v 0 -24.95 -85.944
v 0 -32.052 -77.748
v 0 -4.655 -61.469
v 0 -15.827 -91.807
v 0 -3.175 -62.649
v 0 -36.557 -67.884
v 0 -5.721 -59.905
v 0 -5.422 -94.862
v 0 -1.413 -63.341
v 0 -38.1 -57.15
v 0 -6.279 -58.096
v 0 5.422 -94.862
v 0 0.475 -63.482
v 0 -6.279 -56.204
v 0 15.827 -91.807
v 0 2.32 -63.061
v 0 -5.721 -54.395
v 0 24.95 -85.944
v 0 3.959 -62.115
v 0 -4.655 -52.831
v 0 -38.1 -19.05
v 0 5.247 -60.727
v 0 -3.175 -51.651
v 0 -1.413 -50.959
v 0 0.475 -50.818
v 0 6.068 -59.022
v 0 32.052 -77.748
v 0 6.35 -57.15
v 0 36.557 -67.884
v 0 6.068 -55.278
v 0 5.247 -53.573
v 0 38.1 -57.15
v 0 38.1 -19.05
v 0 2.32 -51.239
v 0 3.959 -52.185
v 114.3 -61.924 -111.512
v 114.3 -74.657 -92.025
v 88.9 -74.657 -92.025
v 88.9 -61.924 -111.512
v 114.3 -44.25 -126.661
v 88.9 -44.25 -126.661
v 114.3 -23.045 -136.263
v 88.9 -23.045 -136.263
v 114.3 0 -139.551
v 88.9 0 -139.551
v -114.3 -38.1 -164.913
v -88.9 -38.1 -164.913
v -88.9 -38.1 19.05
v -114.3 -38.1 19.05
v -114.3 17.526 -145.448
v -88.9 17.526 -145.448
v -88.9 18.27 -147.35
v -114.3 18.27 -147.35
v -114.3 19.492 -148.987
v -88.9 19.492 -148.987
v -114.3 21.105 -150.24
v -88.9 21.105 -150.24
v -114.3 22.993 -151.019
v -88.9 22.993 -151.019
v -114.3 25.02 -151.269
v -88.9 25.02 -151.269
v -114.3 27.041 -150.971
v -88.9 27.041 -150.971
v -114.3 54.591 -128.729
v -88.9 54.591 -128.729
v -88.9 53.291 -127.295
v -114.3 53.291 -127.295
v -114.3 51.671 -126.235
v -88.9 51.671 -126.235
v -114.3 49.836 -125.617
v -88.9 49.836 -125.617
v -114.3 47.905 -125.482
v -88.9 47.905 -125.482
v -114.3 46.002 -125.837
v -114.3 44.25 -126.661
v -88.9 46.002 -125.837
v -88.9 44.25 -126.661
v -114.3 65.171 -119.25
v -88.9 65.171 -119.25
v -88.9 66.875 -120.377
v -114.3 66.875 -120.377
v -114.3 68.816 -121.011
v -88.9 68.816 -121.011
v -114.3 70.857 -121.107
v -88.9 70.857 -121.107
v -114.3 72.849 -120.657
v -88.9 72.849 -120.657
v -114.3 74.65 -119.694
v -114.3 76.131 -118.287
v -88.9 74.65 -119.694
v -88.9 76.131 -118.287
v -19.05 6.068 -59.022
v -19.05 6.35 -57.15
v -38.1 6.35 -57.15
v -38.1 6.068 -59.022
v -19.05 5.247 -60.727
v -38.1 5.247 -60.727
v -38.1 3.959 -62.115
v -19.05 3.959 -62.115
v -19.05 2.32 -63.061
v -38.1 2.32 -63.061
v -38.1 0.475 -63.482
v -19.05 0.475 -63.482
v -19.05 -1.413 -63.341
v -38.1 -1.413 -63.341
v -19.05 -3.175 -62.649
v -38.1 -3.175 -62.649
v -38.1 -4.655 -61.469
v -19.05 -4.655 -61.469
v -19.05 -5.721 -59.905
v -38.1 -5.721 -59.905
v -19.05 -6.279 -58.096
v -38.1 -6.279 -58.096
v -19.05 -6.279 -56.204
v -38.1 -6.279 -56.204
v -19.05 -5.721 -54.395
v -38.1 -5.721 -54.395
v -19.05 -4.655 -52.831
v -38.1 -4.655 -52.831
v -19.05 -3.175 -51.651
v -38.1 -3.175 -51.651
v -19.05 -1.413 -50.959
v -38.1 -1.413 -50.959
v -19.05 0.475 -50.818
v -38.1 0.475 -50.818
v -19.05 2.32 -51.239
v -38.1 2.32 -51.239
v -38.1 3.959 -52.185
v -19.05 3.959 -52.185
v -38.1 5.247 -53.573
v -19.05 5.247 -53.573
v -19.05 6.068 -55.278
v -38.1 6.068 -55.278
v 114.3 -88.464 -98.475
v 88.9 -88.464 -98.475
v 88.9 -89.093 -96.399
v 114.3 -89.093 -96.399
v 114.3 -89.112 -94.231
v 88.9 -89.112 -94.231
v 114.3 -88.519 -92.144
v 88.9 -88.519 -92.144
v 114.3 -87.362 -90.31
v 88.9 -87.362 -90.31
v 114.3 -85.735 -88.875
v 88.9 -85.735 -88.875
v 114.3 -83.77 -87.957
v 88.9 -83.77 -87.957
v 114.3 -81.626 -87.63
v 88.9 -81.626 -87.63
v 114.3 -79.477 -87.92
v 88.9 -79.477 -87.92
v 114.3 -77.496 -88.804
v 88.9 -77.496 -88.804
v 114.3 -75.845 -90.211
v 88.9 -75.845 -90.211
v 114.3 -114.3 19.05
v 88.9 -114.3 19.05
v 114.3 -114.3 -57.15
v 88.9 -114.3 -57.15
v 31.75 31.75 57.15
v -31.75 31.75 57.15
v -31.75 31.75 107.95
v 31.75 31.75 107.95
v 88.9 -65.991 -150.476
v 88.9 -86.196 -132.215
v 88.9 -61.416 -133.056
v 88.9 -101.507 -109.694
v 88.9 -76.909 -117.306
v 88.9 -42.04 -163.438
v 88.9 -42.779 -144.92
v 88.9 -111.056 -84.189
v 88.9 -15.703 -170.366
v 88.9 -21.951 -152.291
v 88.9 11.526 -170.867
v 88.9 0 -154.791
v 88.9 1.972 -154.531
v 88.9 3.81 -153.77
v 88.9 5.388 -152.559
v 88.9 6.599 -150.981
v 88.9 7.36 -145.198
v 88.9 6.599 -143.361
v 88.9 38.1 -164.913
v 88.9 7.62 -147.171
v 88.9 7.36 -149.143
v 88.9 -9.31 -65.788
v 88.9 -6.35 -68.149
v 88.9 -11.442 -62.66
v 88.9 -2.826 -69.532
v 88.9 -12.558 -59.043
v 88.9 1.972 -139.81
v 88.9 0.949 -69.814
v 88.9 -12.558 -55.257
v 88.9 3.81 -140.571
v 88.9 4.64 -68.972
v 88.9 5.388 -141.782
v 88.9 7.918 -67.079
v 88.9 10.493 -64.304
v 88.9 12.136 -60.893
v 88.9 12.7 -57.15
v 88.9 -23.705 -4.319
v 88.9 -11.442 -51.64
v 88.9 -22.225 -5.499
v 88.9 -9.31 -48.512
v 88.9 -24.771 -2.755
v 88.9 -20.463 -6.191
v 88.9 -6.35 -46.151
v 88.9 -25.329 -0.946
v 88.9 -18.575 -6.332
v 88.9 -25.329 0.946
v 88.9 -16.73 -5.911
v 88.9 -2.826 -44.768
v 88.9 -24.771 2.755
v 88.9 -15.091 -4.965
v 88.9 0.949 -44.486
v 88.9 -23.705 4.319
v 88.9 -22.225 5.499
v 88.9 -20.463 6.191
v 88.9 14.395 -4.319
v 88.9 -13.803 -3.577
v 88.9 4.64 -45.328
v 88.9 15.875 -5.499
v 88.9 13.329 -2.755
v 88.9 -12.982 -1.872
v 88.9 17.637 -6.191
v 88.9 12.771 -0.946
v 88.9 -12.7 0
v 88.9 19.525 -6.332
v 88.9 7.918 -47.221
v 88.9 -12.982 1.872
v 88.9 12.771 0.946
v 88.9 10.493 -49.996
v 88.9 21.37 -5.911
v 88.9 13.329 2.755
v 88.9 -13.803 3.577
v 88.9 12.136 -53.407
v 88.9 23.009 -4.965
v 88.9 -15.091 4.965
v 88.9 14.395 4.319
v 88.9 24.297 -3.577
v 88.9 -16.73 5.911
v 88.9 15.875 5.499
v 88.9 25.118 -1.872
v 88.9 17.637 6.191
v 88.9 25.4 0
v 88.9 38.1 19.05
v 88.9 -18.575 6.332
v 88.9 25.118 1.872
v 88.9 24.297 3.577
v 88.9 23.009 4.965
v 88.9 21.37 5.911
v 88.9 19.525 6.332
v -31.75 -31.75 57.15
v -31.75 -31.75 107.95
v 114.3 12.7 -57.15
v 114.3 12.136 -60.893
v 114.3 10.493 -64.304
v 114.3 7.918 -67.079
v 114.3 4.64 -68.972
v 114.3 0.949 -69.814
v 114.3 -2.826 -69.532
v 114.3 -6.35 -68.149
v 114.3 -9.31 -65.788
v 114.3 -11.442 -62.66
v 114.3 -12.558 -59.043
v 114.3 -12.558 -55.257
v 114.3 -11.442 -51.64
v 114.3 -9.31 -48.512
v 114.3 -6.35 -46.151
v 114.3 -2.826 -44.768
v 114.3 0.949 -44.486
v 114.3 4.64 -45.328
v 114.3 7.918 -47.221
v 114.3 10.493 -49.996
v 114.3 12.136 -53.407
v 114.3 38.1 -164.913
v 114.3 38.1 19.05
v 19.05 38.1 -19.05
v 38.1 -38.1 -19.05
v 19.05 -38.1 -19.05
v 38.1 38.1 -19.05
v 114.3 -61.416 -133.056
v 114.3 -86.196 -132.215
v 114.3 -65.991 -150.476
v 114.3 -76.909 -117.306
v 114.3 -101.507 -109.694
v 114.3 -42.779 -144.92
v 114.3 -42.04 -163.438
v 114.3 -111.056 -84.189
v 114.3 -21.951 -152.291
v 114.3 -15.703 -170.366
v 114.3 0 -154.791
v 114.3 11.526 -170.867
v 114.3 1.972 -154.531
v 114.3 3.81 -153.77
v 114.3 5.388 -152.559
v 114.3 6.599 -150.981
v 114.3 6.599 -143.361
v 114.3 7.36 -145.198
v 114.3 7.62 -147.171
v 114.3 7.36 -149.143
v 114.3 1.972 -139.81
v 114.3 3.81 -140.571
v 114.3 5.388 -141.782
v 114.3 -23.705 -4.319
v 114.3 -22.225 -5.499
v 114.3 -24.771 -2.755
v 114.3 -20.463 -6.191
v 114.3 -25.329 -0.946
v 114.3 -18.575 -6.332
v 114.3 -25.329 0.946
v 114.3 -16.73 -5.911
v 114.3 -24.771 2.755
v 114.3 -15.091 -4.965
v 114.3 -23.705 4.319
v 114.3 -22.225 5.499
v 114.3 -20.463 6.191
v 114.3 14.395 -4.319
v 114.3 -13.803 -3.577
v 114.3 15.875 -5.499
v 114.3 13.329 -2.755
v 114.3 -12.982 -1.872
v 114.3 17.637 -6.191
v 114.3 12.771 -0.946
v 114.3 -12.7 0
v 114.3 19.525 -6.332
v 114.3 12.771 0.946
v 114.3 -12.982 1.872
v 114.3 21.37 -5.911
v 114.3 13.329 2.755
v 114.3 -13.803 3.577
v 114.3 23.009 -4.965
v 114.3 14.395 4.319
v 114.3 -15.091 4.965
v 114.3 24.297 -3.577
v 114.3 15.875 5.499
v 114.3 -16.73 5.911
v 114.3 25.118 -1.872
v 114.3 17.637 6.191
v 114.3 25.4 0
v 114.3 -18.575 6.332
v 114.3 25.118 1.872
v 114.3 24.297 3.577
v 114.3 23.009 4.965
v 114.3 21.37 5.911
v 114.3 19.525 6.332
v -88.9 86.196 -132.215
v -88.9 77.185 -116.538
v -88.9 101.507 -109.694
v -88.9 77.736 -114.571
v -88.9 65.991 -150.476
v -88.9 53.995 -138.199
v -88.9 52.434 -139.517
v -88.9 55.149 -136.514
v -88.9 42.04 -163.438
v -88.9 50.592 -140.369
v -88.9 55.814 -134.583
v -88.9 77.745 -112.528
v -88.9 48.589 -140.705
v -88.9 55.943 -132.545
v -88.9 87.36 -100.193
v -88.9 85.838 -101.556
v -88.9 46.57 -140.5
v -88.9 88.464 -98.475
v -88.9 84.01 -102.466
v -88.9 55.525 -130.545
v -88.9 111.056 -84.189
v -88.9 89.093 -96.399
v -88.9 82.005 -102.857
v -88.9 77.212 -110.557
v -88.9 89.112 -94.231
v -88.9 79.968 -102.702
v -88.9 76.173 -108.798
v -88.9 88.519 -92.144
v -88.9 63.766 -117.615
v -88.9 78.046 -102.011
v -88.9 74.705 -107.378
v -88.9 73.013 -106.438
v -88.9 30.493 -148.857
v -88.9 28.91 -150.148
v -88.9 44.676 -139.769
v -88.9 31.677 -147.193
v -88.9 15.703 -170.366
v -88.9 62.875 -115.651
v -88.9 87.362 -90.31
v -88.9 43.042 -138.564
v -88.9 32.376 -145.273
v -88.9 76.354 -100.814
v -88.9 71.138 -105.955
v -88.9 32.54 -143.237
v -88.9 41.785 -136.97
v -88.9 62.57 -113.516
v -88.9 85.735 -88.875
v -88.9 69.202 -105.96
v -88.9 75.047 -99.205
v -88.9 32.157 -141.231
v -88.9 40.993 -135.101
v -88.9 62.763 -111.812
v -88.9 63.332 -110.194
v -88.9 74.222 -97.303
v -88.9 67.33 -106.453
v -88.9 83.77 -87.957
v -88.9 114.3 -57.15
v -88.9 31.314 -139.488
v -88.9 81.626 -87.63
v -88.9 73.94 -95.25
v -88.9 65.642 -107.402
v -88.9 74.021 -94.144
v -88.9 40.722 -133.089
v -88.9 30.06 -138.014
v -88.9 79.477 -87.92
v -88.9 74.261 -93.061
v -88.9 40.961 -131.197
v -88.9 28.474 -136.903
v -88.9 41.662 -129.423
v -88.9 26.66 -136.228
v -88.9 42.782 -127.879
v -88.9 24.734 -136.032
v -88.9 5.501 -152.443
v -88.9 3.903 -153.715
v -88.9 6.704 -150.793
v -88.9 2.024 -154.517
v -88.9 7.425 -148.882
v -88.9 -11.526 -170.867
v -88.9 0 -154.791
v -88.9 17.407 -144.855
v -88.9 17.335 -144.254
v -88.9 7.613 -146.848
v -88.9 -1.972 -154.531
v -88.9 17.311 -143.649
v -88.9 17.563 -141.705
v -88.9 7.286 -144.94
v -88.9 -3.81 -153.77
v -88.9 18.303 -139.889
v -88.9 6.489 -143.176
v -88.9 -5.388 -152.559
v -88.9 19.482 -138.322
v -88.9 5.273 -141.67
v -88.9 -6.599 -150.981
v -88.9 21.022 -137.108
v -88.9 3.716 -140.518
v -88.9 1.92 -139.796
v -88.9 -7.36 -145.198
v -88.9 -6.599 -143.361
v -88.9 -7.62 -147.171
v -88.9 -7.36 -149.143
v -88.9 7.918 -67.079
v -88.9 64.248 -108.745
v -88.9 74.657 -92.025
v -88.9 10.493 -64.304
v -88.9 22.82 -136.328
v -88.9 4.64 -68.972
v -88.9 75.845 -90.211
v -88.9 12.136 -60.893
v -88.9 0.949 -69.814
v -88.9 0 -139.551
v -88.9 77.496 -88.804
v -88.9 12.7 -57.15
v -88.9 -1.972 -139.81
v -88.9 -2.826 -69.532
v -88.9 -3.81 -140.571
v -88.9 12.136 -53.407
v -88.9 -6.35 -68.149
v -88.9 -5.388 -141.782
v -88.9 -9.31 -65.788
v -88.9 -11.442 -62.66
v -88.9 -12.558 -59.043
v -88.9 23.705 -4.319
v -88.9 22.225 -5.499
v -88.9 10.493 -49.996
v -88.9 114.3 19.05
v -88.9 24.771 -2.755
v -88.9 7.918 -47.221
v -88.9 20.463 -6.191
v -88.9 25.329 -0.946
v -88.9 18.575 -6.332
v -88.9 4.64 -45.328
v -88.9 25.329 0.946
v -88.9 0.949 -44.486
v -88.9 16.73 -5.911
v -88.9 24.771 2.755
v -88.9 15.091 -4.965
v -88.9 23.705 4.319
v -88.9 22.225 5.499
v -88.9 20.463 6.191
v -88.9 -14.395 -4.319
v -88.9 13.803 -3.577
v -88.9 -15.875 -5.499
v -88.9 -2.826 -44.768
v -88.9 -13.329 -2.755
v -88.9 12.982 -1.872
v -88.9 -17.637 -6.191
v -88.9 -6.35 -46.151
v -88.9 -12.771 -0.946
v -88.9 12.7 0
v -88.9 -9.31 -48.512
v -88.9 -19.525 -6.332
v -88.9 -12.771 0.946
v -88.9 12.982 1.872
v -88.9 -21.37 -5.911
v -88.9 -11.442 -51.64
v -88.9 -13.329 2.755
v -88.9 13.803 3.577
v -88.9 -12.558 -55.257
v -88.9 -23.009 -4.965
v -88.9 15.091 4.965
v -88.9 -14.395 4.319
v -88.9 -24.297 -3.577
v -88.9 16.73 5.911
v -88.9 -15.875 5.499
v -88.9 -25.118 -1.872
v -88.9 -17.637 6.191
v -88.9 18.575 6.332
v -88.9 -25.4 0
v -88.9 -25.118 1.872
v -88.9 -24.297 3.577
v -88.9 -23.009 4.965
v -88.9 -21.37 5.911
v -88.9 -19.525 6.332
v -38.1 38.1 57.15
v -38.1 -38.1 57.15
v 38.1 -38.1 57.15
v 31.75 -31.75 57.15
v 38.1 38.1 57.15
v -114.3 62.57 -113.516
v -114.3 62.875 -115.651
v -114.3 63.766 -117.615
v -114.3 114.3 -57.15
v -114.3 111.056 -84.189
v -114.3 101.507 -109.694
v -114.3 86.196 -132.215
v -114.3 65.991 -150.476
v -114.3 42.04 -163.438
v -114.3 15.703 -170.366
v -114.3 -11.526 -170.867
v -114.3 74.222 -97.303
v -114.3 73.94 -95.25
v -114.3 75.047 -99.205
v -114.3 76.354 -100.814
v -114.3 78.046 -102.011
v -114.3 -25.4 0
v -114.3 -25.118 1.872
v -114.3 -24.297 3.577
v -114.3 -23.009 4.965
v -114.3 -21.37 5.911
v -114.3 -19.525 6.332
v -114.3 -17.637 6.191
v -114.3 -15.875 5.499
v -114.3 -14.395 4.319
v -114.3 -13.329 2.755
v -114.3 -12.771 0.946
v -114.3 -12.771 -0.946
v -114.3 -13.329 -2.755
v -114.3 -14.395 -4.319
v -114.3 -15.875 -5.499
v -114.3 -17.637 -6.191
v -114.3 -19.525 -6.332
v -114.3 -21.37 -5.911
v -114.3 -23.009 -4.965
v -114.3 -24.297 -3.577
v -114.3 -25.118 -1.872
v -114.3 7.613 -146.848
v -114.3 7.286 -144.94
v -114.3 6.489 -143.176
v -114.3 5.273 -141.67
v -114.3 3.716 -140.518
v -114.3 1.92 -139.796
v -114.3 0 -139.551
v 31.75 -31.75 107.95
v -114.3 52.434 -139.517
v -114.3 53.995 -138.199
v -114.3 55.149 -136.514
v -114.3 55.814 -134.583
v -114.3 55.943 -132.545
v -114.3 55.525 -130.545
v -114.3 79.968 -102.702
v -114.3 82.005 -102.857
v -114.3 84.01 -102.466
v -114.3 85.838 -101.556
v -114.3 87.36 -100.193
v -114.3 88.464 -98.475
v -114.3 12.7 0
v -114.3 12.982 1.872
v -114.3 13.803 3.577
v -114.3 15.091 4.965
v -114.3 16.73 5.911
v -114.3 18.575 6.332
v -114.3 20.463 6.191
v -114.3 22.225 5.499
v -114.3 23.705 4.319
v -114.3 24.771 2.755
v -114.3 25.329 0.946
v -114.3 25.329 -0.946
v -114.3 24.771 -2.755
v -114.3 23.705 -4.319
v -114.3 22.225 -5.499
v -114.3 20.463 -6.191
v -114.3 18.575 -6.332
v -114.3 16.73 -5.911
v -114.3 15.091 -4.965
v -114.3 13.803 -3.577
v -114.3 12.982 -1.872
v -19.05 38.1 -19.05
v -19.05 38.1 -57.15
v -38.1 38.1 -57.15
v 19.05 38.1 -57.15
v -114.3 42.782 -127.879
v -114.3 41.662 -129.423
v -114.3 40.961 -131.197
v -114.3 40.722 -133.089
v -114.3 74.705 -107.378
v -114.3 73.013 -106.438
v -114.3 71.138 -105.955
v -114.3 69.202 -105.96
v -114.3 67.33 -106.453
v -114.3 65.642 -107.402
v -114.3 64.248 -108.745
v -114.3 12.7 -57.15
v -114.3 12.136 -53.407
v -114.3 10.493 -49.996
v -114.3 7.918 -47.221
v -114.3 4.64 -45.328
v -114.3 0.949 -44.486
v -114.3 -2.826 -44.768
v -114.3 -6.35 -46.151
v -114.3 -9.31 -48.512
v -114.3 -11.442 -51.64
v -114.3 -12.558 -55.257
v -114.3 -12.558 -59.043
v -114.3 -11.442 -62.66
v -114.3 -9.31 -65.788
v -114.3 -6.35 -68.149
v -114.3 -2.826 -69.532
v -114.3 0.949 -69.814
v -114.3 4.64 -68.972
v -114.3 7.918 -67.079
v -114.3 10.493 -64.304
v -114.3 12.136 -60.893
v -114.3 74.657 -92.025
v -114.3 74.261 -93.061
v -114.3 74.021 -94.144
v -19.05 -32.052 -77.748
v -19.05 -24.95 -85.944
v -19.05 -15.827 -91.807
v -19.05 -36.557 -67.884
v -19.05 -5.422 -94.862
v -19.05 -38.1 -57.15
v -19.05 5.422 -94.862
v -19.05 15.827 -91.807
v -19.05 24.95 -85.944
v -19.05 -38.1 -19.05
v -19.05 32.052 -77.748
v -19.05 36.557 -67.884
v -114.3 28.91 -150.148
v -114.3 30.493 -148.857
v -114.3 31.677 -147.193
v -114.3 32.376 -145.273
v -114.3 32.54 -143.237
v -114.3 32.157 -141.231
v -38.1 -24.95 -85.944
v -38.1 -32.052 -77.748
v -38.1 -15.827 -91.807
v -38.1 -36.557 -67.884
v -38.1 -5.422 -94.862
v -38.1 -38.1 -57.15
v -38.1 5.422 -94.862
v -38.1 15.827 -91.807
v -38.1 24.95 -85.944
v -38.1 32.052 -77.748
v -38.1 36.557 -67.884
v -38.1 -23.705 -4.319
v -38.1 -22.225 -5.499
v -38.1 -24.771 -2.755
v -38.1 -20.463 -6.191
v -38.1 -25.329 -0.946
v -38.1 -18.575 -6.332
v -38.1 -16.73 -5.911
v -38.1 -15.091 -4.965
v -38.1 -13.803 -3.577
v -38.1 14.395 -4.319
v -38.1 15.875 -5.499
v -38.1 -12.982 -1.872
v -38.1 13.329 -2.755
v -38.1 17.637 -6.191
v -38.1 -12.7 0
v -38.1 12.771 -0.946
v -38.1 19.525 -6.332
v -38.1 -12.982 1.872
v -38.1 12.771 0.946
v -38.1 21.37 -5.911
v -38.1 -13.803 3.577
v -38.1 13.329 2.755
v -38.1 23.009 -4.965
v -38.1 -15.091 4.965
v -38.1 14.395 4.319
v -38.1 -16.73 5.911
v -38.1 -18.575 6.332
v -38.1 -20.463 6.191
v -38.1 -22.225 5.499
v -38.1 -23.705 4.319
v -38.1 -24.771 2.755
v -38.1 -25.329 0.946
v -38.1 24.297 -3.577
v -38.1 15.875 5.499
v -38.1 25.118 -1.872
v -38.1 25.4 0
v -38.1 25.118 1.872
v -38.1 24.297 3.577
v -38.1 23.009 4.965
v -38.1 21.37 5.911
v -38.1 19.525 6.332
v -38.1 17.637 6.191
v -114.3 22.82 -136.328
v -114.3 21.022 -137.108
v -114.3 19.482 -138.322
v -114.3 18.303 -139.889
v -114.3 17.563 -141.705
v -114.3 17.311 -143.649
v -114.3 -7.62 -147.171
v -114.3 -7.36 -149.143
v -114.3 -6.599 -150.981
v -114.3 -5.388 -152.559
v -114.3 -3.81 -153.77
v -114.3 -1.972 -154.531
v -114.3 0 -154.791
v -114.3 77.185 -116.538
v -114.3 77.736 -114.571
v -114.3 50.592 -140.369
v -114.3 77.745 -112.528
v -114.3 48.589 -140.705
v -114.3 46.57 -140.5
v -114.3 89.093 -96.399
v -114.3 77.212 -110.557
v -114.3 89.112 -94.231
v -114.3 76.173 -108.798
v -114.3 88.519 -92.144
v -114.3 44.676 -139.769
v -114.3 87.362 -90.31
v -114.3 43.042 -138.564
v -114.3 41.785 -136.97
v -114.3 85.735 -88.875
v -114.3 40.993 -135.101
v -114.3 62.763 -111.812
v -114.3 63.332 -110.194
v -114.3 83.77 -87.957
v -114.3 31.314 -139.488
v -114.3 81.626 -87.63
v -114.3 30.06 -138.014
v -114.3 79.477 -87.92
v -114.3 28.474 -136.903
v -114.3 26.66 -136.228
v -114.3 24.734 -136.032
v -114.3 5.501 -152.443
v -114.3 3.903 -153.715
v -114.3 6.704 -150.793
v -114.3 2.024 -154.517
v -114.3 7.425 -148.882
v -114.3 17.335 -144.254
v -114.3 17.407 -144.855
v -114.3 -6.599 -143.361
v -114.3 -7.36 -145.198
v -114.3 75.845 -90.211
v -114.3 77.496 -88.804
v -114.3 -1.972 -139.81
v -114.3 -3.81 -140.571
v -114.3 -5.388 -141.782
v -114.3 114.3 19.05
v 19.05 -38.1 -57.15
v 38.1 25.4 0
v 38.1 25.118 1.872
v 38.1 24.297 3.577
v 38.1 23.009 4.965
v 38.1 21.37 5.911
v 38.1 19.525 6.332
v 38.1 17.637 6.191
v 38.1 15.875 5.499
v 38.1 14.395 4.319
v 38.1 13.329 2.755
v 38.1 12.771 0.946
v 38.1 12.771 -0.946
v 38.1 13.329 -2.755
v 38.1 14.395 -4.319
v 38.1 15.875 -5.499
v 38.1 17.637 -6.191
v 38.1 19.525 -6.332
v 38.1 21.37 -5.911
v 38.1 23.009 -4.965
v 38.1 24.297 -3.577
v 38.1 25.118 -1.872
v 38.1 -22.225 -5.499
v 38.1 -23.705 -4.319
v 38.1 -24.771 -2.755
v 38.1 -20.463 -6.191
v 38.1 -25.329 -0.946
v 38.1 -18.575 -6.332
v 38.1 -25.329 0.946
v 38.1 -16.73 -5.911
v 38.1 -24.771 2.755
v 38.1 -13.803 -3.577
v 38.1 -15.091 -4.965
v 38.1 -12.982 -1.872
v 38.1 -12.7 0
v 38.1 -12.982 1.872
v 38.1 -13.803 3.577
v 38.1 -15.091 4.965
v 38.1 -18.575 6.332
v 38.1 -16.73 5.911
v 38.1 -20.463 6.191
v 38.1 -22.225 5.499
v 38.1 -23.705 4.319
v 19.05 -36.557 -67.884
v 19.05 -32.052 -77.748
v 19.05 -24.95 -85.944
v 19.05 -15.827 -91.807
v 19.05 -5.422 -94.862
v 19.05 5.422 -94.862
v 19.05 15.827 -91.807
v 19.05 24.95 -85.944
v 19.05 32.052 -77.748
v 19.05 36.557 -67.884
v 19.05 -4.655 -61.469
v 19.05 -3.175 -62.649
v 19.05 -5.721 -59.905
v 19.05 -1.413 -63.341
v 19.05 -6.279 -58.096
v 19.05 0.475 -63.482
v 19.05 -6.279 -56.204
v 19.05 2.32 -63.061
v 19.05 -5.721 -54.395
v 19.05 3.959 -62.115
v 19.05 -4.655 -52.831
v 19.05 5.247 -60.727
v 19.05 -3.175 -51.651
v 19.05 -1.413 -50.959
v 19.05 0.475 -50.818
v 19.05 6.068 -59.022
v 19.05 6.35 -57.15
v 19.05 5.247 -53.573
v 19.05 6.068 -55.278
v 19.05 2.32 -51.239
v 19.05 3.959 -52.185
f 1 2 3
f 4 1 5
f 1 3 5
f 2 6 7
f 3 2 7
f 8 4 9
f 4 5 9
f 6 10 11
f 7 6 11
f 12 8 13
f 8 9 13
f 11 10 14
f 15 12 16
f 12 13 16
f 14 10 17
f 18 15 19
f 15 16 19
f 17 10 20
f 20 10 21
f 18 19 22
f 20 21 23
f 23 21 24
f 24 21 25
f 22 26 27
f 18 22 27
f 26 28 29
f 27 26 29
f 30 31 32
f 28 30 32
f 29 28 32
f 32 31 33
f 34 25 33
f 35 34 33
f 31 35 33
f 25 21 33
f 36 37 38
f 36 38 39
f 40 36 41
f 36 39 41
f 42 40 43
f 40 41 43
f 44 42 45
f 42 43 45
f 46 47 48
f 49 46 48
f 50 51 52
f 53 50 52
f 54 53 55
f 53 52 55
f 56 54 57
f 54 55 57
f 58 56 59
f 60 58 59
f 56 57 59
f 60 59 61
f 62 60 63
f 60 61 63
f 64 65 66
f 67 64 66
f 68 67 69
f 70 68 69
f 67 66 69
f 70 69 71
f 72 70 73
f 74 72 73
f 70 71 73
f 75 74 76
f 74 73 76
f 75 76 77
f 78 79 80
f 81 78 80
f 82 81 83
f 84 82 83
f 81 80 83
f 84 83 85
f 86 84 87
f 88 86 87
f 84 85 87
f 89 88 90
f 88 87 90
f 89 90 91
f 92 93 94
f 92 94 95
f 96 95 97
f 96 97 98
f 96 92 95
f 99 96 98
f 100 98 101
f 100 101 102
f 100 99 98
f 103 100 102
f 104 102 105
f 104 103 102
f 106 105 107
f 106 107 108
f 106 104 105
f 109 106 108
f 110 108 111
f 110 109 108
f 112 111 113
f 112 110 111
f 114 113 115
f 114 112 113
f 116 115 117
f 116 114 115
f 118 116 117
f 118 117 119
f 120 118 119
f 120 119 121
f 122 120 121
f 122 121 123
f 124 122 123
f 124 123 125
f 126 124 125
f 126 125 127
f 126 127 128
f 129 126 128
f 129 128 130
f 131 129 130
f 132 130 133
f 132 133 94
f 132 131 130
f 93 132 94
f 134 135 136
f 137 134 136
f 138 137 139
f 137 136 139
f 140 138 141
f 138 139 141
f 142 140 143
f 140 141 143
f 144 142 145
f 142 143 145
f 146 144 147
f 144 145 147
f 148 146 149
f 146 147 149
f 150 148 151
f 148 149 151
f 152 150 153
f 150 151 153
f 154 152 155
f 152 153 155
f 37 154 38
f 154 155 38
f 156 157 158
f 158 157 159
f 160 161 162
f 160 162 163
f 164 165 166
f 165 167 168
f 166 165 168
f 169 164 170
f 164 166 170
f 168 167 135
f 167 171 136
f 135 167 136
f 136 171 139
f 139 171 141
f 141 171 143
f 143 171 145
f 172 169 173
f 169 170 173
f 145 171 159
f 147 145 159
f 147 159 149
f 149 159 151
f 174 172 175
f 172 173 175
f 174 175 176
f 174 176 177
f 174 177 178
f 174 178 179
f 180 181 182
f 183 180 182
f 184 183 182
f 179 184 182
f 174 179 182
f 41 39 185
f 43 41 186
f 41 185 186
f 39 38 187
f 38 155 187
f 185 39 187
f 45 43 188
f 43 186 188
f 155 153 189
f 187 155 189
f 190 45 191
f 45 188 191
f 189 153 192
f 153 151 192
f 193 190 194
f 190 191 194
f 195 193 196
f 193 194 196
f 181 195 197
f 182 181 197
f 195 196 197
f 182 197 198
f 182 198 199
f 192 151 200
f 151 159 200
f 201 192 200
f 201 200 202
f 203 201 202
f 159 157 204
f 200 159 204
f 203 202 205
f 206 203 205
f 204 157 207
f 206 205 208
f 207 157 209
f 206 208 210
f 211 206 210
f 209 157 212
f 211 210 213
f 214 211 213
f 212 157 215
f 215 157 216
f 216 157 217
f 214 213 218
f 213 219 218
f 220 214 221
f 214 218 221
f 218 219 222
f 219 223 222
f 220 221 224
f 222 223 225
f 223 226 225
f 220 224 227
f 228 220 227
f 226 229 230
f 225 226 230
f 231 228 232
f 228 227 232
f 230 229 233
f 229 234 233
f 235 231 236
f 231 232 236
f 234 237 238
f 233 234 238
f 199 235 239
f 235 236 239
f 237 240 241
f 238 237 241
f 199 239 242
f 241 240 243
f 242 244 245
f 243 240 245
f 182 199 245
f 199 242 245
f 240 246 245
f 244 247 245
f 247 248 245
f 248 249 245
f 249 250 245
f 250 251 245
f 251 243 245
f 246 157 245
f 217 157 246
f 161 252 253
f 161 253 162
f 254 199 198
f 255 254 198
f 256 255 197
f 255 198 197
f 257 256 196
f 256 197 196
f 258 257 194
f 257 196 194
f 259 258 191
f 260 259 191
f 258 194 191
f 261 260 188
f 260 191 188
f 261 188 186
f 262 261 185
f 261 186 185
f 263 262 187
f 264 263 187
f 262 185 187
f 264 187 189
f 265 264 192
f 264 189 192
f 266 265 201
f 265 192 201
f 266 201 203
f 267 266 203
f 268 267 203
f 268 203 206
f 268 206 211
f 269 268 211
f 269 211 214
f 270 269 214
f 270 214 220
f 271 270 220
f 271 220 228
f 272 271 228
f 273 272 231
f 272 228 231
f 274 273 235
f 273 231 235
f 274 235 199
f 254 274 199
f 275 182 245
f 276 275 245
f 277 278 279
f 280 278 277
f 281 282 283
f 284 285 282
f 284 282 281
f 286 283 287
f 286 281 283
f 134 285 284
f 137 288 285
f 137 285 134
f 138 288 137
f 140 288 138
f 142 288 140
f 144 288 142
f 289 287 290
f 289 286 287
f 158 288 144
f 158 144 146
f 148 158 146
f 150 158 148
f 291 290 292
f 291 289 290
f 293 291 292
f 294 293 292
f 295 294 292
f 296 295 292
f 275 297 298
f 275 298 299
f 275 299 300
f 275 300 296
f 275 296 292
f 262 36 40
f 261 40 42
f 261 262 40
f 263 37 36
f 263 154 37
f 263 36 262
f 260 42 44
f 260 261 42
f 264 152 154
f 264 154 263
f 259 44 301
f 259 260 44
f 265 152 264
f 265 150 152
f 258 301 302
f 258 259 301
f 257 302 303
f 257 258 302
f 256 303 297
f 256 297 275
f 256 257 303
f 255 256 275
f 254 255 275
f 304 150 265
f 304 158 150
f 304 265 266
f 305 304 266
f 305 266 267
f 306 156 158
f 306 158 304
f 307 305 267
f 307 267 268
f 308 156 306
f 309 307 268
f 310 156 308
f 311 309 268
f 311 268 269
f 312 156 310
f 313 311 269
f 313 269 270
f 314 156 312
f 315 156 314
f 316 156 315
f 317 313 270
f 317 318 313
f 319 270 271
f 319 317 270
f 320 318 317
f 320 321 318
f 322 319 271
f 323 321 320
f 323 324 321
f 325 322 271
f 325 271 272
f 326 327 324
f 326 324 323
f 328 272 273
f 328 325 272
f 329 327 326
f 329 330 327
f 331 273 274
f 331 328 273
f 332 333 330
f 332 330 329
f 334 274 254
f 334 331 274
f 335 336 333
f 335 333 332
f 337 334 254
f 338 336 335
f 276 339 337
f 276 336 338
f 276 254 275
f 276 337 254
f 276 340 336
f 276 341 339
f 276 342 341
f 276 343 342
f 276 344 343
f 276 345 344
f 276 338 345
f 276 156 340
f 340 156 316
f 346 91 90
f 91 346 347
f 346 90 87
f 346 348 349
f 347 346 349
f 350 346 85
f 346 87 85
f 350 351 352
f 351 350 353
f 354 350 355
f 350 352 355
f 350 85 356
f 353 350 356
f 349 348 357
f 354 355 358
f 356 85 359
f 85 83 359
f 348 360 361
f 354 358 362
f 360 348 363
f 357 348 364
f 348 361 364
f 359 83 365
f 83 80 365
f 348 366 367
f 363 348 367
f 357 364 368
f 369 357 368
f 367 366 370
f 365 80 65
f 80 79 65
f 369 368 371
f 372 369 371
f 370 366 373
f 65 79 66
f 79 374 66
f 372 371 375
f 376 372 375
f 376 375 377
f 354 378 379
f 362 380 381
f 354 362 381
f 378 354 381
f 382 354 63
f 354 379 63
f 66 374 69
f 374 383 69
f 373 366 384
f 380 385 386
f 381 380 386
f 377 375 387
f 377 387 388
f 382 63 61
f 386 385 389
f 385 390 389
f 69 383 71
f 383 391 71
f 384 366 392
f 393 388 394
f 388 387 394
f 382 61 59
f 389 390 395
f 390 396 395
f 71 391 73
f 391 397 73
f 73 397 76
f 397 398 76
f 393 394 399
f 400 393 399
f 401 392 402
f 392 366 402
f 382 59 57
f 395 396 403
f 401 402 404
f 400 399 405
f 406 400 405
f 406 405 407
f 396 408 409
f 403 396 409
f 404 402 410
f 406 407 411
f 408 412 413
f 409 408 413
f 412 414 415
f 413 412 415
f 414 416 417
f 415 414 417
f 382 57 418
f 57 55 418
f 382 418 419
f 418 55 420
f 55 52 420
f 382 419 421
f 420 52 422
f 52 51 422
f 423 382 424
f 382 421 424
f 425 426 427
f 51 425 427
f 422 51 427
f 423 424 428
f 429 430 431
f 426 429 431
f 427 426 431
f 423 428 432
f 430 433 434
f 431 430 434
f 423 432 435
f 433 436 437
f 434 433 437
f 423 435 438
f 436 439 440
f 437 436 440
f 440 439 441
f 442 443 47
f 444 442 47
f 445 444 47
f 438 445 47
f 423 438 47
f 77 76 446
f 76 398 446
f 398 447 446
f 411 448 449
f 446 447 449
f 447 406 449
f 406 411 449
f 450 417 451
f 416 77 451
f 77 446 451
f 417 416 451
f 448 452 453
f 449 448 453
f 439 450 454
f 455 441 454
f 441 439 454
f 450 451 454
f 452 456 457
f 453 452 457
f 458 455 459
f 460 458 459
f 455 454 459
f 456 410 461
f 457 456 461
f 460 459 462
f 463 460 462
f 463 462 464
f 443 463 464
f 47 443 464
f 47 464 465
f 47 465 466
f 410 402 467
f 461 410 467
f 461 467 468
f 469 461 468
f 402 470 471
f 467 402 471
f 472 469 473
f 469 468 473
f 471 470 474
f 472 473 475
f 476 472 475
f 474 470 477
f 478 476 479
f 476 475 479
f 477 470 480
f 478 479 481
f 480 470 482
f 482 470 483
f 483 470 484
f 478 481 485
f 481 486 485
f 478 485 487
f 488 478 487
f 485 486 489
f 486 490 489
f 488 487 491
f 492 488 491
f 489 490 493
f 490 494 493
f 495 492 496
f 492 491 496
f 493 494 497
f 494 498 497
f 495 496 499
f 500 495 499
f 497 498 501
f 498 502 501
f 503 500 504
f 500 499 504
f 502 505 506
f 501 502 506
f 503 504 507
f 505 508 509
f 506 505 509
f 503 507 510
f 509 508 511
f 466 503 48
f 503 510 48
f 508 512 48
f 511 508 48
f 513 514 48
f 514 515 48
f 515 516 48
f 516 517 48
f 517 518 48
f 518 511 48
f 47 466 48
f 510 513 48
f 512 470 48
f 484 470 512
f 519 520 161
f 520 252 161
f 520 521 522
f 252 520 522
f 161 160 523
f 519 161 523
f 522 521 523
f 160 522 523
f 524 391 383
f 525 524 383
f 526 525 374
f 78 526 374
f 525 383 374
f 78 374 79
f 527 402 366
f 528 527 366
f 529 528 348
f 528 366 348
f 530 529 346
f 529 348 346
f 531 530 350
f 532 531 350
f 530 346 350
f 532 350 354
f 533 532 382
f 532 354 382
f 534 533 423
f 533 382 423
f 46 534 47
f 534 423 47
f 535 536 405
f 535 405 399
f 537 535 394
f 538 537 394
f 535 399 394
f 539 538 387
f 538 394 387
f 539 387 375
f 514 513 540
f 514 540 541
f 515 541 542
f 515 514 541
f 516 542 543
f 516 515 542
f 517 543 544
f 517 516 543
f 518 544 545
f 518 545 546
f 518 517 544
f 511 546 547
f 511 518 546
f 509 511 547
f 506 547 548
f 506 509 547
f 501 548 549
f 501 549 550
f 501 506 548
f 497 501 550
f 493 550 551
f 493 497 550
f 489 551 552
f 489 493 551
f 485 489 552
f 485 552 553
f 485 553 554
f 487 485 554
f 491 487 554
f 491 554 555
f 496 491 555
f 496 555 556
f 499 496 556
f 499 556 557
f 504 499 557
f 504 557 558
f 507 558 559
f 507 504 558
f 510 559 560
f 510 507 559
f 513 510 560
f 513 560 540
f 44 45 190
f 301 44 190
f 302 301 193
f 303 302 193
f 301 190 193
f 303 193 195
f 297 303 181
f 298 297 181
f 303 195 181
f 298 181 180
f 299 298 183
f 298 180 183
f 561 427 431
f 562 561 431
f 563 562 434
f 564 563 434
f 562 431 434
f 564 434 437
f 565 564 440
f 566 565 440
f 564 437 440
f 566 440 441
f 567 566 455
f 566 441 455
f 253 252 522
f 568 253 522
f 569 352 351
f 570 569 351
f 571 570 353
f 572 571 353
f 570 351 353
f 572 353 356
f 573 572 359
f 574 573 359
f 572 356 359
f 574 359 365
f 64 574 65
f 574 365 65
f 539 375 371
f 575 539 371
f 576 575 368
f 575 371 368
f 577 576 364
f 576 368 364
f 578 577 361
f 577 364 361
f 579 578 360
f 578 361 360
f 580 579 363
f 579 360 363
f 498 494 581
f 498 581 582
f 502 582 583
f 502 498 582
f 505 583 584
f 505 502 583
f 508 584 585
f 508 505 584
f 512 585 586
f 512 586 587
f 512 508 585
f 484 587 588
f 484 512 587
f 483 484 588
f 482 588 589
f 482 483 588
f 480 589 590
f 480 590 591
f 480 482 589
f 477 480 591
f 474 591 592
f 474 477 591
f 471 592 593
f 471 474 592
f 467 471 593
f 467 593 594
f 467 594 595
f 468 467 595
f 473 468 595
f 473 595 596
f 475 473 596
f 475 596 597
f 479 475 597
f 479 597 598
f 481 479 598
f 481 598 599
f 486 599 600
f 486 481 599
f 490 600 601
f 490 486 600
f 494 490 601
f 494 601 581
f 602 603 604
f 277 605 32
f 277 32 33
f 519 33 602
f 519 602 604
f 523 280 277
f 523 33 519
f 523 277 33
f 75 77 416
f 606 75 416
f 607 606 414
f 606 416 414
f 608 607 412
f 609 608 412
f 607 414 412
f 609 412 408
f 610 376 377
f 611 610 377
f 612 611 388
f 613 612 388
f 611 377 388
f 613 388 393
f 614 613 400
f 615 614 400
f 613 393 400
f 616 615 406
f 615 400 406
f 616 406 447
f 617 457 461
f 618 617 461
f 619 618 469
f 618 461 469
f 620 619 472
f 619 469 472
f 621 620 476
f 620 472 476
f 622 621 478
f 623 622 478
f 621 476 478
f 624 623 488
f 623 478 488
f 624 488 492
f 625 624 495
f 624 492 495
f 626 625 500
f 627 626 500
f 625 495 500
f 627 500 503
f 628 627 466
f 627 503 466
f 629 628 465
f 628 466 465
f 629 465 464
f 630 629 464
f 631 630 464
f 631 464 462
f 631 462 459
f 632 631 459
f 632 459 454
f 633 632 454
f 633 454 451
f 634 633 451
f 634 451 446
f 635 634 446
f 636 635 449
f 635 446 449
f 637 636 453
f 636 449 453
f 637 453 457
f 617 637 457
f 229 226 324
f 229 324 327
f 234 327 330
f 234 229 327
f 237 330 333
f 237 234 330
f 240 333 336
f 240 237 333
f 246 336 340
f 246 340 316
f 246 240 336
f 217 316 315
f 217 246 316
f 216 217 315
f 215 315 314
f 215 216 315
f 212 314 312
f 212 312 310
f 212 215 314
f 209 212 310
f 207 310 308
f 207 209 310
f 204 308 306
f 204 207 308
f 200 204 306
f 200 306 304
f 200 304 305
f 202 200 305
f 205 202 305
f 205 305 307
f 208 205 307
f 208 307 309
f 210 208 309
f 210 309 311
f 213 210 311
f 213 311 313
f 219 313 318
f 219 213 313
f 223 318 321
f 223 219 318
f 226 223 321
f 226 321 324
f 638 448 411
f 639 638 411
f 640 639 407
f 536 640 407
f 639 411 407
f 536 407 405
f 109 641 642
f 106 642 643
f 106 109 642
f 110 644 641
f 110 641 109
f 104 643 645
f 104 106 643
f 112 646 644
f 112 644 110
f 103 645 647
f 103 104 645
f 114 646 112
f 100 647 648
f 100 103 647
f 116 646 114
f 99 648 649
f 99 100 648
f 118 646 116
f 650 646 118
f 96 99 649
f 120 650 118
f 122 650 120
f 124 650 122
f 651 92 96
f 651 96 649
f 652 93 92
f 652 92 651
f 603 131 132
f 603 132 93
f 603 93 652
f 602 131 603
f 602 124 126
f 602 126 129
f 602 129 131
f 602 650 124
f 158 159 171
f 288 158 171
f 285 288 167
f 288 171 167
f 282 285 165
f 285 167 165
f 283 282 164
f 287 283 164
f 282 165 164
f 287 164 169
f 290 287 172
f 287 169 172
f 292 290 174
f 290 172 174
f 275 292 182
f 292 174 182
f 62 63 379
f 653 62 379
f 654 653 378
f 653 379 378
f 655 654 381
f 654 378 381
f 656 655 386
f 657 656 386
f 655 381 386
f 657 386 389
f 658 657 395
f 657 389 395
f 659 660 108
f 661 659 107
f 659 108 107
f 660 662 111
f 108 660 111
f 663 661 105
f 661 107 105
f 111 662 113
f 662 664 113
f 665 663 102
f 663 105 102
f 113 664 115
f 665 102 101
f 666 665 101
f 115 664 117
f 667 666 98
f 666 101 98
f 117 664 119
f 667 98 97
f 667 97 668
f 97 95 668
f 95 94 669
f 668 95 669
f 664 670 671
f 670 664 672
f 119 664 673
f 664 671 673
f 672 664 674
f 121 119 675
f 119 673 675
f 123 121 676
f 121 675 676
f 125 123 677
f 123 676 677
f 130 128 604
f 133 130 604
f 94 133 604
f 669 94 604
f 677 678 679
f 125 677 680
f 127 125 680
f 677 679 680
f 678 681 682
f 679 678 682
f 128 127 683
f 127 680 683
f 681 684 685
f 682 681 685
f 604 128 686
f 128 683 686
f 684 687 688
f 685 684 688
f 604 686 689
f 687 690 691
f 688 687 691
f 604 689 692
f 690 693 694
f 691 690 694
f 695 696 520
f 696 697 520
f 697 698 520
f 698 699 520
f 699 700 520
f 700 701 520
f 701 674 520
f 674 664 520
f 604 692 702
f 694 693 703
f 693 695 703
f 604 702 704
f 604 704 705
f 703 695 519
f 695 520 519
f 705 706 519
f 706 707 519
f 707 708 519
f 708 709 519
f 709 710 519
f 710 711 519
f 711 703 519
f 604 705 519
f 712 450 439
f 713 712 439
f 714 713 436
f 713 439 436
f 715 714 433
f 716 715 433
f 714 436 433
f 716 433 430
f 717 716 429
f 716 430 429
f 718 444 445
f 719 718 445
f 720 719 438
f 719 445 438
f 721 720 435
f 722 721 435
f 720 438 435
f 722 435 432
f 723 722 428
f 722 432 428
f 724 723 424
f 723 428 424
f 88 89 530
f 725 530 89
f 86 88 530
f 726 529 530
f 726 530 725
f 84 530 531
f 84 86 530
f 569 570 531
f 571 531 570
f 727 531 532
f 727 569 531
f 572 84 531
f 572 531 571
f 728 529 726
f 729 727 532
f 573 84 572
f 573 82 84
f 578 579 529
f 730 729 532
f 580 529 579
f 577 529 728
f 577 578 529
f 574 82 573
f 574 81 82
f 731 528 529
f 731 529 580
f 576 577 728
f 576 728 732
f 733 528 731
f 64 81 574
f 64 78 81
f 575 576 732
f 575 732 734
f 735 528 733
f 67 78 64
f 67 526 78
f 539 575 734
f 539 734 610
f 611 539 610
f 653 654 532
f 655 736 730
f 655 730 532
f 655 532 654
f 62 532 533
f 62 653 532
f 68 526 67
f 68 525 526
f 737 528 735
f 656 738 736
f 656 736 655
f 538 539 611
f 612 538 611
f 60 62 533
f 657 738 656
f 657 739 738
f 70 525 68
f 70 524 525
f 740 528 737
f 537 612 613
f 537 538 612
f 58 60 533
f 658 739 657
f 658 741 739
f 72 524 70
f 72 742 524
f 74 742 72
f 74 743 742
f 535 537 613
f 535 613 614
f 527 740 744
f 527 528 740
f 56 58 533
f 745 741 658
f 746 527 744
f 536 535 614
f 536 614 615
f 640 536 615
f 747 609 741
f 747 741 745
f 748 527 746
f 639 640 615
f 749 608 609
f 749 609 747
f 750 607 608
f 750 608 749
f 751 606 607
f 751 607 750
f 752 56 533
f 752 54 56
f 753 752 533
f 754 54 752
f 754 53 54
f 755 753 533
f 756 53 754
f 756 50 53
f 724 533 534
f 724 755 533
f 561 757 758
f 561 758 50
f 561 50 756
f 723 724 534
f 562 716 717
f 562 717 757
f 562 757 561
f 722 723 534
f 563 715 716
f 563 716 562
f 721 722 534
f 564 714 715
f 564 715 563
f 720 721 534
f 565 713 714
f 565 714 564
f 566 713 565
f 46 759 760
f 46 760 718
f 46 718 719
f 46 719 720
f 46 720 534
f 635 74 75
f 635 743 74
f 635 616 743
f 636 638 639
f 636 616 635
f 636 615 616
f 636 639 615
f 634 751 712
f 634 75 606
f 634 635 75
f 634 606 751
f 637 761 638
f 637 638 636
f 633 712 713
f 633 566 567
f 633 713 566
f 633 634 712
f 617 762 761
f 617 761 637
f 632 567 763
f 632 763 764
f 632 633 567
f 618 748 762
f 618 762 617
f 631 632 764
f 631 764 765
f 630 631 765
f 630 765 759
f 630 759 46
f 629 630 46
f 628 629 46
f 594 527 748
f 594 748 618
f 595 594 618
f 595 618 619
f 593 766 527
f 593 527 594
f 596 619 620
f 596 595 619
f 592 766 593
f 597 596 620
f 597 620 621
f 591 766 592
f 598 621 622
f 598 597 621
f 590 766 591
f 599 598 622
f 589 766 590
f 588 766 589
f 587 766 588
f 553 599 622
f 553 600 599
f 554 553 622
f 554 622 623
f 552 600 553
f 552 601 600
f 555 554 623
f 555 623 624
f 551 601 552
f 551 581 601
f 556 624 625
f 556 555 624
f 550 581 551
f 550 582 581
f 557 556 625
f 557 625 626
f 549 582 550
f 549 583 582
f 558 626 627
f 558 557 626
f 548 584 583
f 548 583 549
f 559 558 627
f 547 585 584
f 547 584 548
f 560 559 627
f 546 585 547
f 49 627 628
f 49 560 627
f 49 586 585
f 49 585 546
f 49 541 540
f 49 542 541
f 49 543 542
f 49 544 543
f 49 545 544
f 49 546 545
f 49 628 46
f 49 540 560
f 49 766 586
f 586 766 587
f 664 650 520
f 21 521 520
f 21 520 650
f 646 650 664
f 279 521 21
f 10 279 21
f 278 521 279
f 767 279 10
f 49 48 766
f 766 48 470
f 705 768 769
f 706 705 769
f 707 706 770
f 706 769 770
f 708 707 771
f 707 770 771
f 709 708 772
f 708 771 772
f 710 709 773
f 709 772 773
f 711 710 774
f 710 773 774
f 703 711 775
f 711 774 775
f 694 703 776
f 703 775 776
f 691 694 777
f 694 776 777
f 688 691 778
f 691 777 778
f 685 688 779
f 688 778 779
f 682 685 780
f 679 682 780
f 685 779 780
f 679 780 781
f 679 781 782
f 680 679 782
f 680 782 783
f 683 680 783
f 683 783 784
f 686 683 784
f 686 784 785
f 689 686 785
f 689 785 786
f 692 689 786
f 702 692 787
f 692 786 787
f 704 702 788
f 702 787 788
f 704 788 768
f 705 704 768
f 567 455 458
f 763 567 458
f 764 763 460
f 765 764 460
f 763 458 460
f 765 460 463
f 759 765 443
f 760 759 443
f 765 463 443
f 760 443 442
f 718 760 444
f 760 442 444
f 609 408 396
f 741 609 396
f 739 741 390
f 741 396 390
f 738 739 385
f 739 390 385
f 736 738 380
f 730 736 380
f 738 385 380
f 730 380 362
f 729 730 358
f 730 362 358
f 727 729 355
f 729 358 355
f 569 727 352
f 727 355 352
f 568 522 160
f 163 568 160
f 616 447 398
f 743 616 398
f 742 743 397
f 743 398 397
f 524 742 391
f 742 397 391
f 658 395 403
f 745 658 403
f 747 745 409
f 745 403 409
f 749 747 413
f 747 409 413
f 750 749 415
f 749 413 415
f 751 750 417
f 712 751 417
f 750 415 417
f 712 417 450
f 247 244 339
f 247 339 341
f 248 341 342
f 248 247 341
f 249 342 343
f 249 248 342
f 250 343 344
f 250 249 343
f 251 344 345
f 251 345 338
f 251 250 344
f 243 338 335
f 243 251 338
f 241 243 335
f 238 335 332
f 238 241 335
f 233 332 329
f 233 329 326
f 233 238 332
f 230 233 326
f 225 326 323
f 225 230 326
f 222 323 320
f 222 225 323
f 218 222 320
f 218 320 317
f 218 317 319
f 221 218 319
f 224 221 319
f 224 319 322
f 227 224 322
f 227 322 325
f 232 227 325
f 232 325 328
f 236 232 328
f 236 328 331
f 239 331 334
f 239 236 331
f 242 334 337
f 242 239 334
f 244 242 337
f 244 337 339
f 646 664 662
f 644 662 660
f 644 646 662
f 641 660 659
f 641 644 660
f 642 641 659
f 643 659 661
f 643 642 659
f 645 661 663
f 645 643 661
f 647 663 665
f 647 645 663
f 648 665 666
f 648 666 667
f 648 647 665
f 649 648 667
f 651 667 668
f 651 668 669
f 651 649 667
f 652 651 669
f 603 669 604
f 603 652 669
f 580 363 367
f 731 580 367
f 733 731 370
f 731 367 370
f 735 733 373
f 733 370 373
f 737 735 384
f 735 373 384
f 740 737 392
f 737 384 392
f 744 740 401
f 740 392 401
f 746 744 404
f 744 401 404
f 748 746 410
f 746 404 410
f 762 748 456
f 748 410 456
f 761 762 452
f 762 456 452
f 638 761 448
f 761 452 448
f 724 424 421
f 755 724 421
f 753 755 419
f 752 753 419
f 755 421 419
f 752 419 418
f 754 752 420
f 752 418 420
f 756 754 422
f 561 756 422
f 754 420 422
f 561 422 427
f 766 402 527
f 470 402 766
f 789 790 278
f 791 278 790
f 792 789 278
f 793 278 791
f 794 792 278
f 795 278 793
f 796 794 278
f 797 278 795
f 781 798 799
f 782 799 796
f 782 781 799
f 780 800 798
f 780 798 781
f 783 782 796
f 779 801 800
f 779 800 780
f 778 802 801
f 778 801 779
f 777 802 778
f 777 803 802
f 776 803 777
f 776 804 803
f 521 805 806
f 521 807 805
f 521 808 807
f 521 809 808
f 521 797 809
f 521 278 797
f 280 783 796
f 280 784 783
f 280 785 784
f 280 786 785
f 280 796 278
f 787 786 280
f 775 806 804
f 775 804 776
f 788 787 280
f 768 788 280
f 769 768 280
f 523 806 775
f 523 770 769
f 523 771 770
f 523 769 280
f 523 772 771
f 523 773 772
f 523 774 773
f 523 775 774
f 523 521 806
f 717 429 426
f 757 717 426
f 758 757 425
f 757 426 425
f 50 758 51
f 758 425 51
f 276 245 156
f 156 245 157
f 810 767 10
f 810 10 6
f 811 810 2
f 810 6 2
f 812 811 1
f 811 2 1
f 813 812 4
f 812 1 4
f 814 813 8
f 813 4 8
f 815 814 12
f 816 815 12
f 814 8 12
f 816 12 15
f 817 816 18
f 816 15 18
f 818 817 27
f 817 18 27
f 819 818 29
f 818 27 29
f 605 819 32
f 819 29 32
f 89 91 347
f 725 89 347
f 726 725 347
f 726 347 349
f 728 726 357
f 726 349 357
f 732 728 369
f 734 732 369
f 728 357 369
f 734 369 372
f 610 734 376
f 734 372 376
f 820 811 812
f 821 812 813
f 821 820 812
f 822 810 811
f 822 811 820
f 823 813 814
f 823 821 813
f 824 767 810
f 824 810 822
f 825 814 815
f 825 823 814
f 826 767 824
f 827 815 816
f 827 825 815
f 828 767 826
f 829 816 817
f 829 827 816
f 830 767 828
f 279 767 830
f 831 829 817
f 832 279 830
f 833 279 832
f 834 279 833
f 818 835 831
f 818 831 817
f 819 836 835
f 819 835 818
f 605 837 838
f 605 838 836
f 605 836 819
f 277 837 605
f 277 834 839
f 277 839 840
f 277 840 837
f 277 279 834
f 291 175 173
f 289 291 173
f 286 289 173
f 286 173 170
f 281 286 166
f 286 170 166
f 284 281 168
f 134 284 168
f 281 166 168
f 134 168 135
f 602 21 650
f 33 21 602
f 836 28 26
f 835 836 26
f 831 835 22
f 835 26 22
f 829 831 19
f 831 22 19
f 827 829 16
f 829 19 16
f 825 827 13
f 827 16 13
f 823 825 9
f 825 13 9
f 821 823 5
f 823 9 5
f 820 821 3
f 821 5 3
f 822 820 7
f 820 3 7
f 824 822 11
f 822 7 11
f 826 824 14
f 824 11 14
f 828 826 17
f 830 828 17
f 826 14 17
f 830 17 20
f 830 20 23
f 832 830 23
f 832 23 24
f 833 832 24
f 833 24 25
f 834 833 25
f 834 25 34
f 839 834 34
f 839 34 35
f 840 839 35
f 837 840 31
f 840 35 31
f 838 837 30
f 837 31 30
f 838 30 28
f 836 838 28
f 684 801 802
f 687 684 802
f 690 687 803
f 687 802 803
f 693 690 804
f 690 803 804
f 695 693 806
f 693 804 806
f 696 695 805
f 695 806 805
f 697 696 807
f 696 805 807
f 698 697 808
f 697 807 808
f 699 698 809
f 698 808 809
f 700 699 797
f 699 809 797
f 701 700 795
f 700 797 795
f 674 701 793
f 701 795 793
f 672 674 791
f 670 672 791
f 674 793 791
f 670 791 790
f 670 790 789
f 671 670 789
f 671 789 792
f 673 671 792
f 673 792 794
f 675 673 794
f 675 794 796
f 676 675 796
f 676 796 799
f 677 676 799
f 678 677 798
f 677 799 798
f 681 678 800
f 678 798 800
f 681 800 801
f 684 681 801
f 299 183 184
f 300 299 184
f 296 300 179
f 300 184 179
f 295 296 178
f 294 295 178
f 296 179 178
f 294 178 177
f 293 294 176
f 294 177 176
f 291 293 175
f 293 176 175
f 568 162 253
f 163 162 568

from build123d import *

# Parameters (mm, degrees)
F0_W      = 76.2
F0_H      = 76.2
F1_DEPTH  = 38.1
F2_DEPTH  = 19.05
F3_START  = -19.05
F3_DEPTH  = 19.05
F4_W      = 63.5
F4_H      = 63.5
F5_DEPTH  = 50.8
F7_START  = 50.8
F6_W      = 76.2
F6_H      = 38.1
F6_R      = 6.35
F7_DEPTH  = 25.4
F8_DEPTH  = 76.2
F10_START = 50.8
F9_W      = 76.2
F9_H      = 76.2
F9_R      = 6.35
F10_DEPTH = 25.4


with BuildPart() as f1:
    # F0 (on Right) → F1 (new body, symmetric)
    with BuildSketch(Plane.YZ):
        with Locations((0, 19.05)):
            Rectangle(F0_W, F0_H)
    extrude(amount=F1_DEPTH, both=True)

    # F0 (on Right) → F2 (join)
    with BuildSketch(Plane.YZ):
        with BuildLine():
            Line((6.35, -57.15), (38.1, -57.15))
            Line((38.1, -57.15), (38.1, -19.05))
            Line((38.1, -19.05), (-38.1, -19.05))
            Line((-38.1, -19.05), (-38.1, -57.15))
            Line((-38.1, -57.15), (-6.35, -57.15))
            ThreePointArc((-6.35, -57.15), (0, -50.8), (6.35, -57.15))
        make_face()
        with BuildLine():
            ThreePointArc((-38.1, -57.15), (0, -95.25), (38.1, -57.15))
            Line((38.1, -57.15), (6.35, -57.15))
            ThreePointArc((6.35, -57.15), (0, -63.5), (-6.35, -57.15))
            Line((-6.35, -57.15), (-38.1, -57.15))
        make_face()
    extrude(amount=F2_DEPTH)

    # F0 (on Right) → F3 (join)
    with BuildSketch(Plane.YZ.offset(F3_START)):
        with BuildLine():
            Line((6.35, -57.15), (38.1, -57.15))
            Line((38.1, -57.15), (38.1, -19.05))
            Line((38.1, -19.05), (-38.1, -19.05))
            Line((-38.1, -19.05), (-38.1, -57.15))
            Line((-38.1, -57.15), (-6.35, -57.15))
            ThreePointArc((-6.35, -57.15), (0, -50.8), (6.35, -57.15))
        make_face()
        with BuildLine():
            ThreePointArc((-38.1, -57.15), (0, -95.25), (38.1, -57.15))
            Line((38.1, -57.15), (6.35, -57.15))
            ThreePointArc((6.35, -57.15), (0, -63.5), (-6.35, -57.15))
            Line((-6.35, -57.15), (-38.1, -57.15))
        make_face()
    extrude(amount=-F3_DEPTH)

    # F4 (on face) → F5 (join)
    with BuildSketch(Plane.XY.offset(57.15)):
        Rectangle(F4_W, F4_H)
    extrude(amount=F5_DEPTH)

    # F6 (on face) → F8 (cut)
    with BuildSketch(Plane.YZ.offset(38.1)):
        with Locations((19.05, 0)):
            Circle(F6_R)
        with Locations((-19.05, 0)):
            Circle(F6_R)
    extrude(amount=-F8_DEPTH, mode=Mode.SUBTRACT)


with BuildPart() as f7:
    # F6 (on face) → F7 (new body)
    with BuildSketch(Plane.YZ.offset(38.1).offset(F7_START)):
        with BuildLine():
            Line((-38.1, -19.05), (-38.1, 19.05))
            Line((-38.1, 19.05), (-114.3, 19.05))
            Line((-114.3, 19.05), (-114.3, -57.15))
            Line((-114.3, -57.15), (-12.7, -57.15))
            ThreePointArc((-12.7, -57.15), (0, -44.45), (12.7, -57.15))
            Line((12.7, -57.15), (38.1, -57.15))
            Line((38.1, -57.15), (38.1, -19.05))
            Line((38.1, -19.05), (-38.1, -19.05))
        make_face()
        Rectangle(F6_W, F6_H)
        with Locations((-19.05, 0)):
            Circle(F6_R, mode=Mode.SUBTRACT)
        with Locations((19.05, 0)):
            Circle(F6_R, mode=Mode.SUBTRACT)
        with BuildLine():
            Line((38.1, -164.9130734528), (38.1, -57.15))
            Line((38.1, -57.15), (12.7, -57.15))
            ThreePointArc((12.7, -57.15), (0, -69.85), (-12.7, -57.15))
            Line((-12.7, -57.15), (-114.3, -57.15))
            ThreePointArc((-114.3, -57.15), (-65.9911357684, -150.4755592), (38.1, -164.9130734528))
        make_face()
        with BuildLine():
            ThreePointArc((0, -139.5505859333), (5.3881536726, -141.7824322606), (7.62, -147.1705859333))
            ThreePointArc((7.62, -147.1705859333), (5.3881536726, -152.5587396059), (0, -154.7905859333))
            ThreePointArc((0, -154.7905859333), (-52.4341526223, -139.5171273032), (-88.4642484023, -98.4750623231))
            ThreePointArc((-88.4642484023, -98.4750623231), (-84.7854441992, -88.3461334738), (-74.6565153498, -92.0249376769))
            ThreePointArc((-74.6565153498, -92.0249376769), (-44.2500918823, -126.6610489818), (0, -139.5505859333))
        make_face(mode=Mode.SUBTRACT)
    extrude(amount=F7_DEPTH)


with BuildPart() as f10:
    # F9 (on face) → F10 (new body)
    with BuildSketch(Plane(origin=(-38.1, 0, 0), x_dir=(0, -1, 0), z_dir=(-1, 0, 0)).offset(F10_START)):
        with BuildLine():
            Line((38.1, -164.9130734528), (38.1, -57.15))
            ThreePointArc((38.1, -57.15), (0, -95.25), (-38.1, -57.15))
            Line((-38.1, -57.15), (-114.3, -57.15))
            ThreePointArc((-114.3, -57.15), (-65.9911357684, -150.4755592), (38.1, -164.9130734528))
        make_face()
        with BuildLine():
            ThreePointArc((0, -139.5505859333), (5.3881536726, -141.7824322606), (7.62, -147.1705859333))
            ThreePointArc((7.62, -147.1705859333), (5.3881536726, -152.5587396059), (0, -154.7905859333))
            ThreePointArc((0, -154.7905859333), (-13.6547517033, -153.8310828307), (-27.0411359752, -150.971431382))
            ThreePointArc((-27.0411359752, -150.971431382), (-40.148233376, -146.1545132461), (-52.4341525835, -139.5171273279))
            ThreePointArc((-52.4341525835, -139.5171273279), (-65.1530955384, -129.8738486547), (-76.1309817391, -118.2872034103))
            ThreePointArc((-76.1309817391, -118.2872034103), (-82.8916623065, -108.7509335327), (-88.4642484023, -98.4750623231))
            ThreePointArc((-88.4642484023, -98.4750623231), (-84.7854441992, -88.3461334738), (-74.6565153498, -92.0249376769))
            ThreePointArc((-74.6565153498, -92.0249376769), (-69.9537130966, -100.6969239573), (-64.2482572577, -108.7447478092))
            ThreePointArc((-64.2482572577, -108.7447478092), (-54.9838287437, -118.5229186109), (-44.2500922915, -126.6610487213))
            ThreePointArc((-44.2500922915, -126.6610487213), (-33.8817914002, -132.2624541847), (-22.8204839226, -136.3275351706))
            ThreePointArc((-22.8204839226, -136.3275351706), (-11.5234819247, -138.7408446241), (0, -139.5505859333))
        make_face(mode=Mode.SUBTRACT)
        with BuildLine():
            ThreePointArc((-88.4642484023, -98.4750623231), (-82.8916623065, -108.7509335327), (-76.1309817391, -118.2872034103))
            ThreePointArc((-76.1309817391, -118.2872034103), (-77.745354181, -112.5284154235), (-74.7051121262, -107.3780012939))
            ThreePointArc((-74.7051121262, -107.3780012939), (-76.4226877427, -104.7239286789), (-78.0460125131, -102.0111839186))
            ThreePointArc((-78.0460125131, -102.0111839186), (-84.0095065645, -102.4656904216), (-88.4642484023, -98.4750623231))
        make_face()
        with BuildLine():
            ThreePointArc((-74.7051121262, -107.3780012939), (-69.2020593767, -105.9602409234), (-64.2482572577, -108.7447478092))
            ThreePointArc((-64.2482572577, -108.7447478092), (-69.9537130966, -100.6969239573), (-74.6565153498, -92.0249376769))
            ThreePointArc((-74.6565153498, -92.0249376769), (-74.1215693724, -93.5981923432), (-73.9403818761, -95.25))
            ThreePointArc((-73.9403818761, -95.25), (-75.0471685928, -99.2050540739), (-78.0460125131, -102.0111839186))
            ThreePointArc((-78.0460125131, -102.0111839186), (-76.4226877427, -104.7239286789), (-74.7051121262, -107.3780012939))
        make_face()
        with BuildLine():
            ThreePointArc((-76.1309817391, -118.2872034103), (-65.1530955384, -129.8738486547), (-52.4341525835, -139.5171273279))
            ThreePointArc((-52.4341525835, -139.5171273279), (-55.8142312826, -134.5830716226), (-54.5912119147, -128.7286663291))
            ThreePointArc((-54.5912119147, -128.7286663291), (-60.0684621173, -124.1983836541), (-65.171206772, -119.250078097))
            ThreePointArc((-65.171206772, -119.250078097), (-70.856508475, -121.1067369272), (-76.1309817391, -118.2872034103))
        make_face()
        with BuildLine():
            ThreePointArc((-54.5912119147, -128.7286663291), (-49.8361059477, -125.6169791552), (-44.2500922915, -126.6610487213))
            ThreePointArc((-44.2500922915, -126.6610487213), (-54.9838287437, -118.5229186109), (-64.2482572577, -108.7447478092))
            ThreePointArc((-64.2482572577, -108.7447478092), (-63.001518977, -110.9870212595), (-62.569619596, -113.5159754882))
            ThreePointArc((-62.569619596, -113.5159754882), (-63.250429956, -116.664315867), (-65.171206772, -119.250078097))
            ThreePointArc((-65.171206772, -119.250078097), (-60.0684621173, -124.1983836541), (-54.5912119147, -128.7286663291))
        make_face()
        with BuildLine():
            ThreePointArc((-52.4341525835, -139.5171273279), (-40.148233376, -146.1545132461), (-27.0411359752, -150.971431382))
            ThreePointArc((-27.0411359752, -150.971431382), (-31.6769428237, -147.1926579159), (-32.156880188, -141.2311569161))
            ThreePointArc((-32.156880188, -141.2311569161), (-37.015012093, -139.2084838485), (-41.7466532468, -136.9053937641))
            ThreePointArc((-41.7466532468, -136.9053937641), (-46.5332305056, -140.4912709725), (-52.4341525835, -139.5171273279))
        make_face()
        with BuildLine():
            ThreePointArc((-32.156880188, -141.2311569161), (-28.4739844377, -136.9033503077), (-22.8204839226, -136.3275351706))
            ThreePointArc((-22.8204839226, -136.3275351706), (-33.8817914002, -132.2624541847), (-44.2500922915, -126.6610487213))
            ThreePointArc((-44.2500922915, -126.6610487213), (-41.6620897561, -129.4228140325), (-40.7221222523, -133.0890881425))
            ThreePointArc((-40.7221222523, -133.0890881425), (-40.9827108009, -135.0648065154), (-41.7466532468, -136.9053937641))
            ThreePointArc((-41.7466532468, -136.9053937641), (-37.015012093, -139.2084838485), (-32.156880188, -141.2311569161))
        make_face()
        with BuildLine():
            ThreePointArc((-27.0411359752, -150.971431382), (-13.6547517033, -153.8310828307), (0, -154.7905859333))
            ThreePointArc((0, -154.7905859333), (-5.5009952504, -152.4434837376), (-7.6131721201, -146.8480797009))
            ThreePointArc((-7.6131721201, -146.8480797009), (-12.5891166022, -146.2859637573), (-17.5261054923, -145.4480266939))
            ThreePointArc((-17.5261054923, -145.4480266939), (-21.1052888672, -150.2396117394), (-27.0411359752, -150.971431382))
        make_face()
        with BuildLine():
            ThreePointArc((-7.6131721201, -146.8480797009), (-5.2728978043, -141.6695906828), (0, -139.5505859333))
            ThreePointArc((0, -139.5505859333), (-11.5234819247, -138.7408446241), (-22.8204839226, -136.3275351706))
            ThreePointArc((-22.8204839226, -136.3275351706), (-18.8420871271, -139.0677959975), (-17.3108095377, -143.6494833948))
            ThreePointArc((-17.3108095377, -143.6494833948), (-17.3648249743, -144.5551751673), (-17.5261054923, -145.4480266939))
            ThreePointArc((-17.5261054923, -145.4480266939), (-12.5891166022, -146.2859637573), (-7.6131721201, -146.8480797009))
        make_face()
        with BuildLine():
            ThreePointArc((-38.1, -57.15), (0, -95.25), (38.1, -57.15))
            Line((38.1, -57.15), (12.7, -57.15))
            ThreePointArc((12.7, -57.15), (0, -69.85), (-12.7, -57.15))
            Line((-12.7, -57.15), (-38.1, -57.15))
        make_face()
        with Locations((-76.2, -19.05)):
            Rectangle(F9_W, F9_H)
        with BuildLine():
            Line((38.1, -57.15), (38.1, 19.05))
            Line((38.1, 19.05), (-38.1, 19.05))
            Line((-38.1, 19.05), (-38.1, -57.15))
            Line((-38.1, -57.15), (-12.7, -57.15))
            ThreePointArc((-12.7, -57.15), (0, -44.45), (12.7, -57.15))
            Line((12.7, -57.15), (38.1, -57.15))
        make_face()
        with Locations((-19.05, 0)):
            Circle(F9_R, mode=Mode.SUBTRACT)
        with Locations((19.05, 0)):
            Circle(F9_R, mode=Mode.SUBTRACT)
    extrude(amount=F10_DEPTH)


solid = Compound([f1.part, f7.part, f10.part])
